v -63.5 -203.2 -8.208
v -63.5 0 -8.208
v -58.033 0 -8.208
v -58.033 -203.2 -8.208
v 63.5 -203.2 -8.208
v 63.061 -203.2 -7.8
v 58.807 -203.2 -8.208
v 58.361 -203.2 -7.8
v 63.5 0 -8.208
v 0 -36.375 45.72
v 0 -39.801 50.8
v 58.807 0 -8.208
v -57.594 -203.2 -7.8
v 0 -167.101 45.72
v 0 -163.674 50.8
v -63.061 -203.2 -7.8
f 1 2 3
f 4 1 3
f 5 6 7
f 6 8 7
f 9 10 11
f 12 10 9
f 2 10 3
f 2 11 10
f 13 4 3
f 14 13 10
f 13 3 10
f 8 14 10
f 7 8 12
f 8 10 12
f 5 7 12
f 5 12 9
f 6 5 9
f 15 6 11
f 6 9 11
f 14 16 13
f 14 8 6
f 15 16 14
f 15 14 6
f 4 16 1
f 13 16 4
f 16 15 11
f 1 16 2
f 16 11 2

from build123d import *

# Parameters (mm, degrees)
F1_DEPTH      = 203.2
F3_DEPTH      = 124.968
F3_DEPTH_BACK = 110.49
F5_DEPTH      = 83.566
F5_DEPTH_BACK = 103.124


with BuildPart() as f1:
    # F0 (on Front) → F1 (new body)
    with BuildSketch(Plane.XZ):
        Polygon((63.5, -8.2080368082), (0, 50.8), (-63.5, -8.2080368082), (-58.0332870326, -8.2080368082), (0, 45.72), (58.8067129674, -8.2080368082), align=None)
    extrude(amount=F1_DEPTH)

    # F2 (on Right) → F3 (cut, two sides)
    with BuildSketch(Plane.YZ) as f3_sk:
        Polygon((0, -8.2080368082), (0, 51.2279631918), (-40.090088207, 51.2279631918), align=None)
    extrude(amount=-F3_DEPTH, mode=Mode.SUBTRACT)
    extrude(f3_sk.sketch, amount=F3_DEPTH_BACK, mode=Mode.SUBTRACT)

    # F4 (on Right) → F5 (cut, two sides)
    with BuildSketch(Plane.YZ) as f5_sk:
        Polygon((-203.4754604101, 51.2279631918), (-203.4754604101, -8.2080368082), (-163.3853722031, 51.2279631918), align=None)
    extrude(amount=-F5_DEPTH, mode=Mode.SUBTRACT)
    extrude(f5_sk.sketch, amount=F5_DEPTH_BACK, mode=Mode.SUBTRACT)


solid = f1.part
